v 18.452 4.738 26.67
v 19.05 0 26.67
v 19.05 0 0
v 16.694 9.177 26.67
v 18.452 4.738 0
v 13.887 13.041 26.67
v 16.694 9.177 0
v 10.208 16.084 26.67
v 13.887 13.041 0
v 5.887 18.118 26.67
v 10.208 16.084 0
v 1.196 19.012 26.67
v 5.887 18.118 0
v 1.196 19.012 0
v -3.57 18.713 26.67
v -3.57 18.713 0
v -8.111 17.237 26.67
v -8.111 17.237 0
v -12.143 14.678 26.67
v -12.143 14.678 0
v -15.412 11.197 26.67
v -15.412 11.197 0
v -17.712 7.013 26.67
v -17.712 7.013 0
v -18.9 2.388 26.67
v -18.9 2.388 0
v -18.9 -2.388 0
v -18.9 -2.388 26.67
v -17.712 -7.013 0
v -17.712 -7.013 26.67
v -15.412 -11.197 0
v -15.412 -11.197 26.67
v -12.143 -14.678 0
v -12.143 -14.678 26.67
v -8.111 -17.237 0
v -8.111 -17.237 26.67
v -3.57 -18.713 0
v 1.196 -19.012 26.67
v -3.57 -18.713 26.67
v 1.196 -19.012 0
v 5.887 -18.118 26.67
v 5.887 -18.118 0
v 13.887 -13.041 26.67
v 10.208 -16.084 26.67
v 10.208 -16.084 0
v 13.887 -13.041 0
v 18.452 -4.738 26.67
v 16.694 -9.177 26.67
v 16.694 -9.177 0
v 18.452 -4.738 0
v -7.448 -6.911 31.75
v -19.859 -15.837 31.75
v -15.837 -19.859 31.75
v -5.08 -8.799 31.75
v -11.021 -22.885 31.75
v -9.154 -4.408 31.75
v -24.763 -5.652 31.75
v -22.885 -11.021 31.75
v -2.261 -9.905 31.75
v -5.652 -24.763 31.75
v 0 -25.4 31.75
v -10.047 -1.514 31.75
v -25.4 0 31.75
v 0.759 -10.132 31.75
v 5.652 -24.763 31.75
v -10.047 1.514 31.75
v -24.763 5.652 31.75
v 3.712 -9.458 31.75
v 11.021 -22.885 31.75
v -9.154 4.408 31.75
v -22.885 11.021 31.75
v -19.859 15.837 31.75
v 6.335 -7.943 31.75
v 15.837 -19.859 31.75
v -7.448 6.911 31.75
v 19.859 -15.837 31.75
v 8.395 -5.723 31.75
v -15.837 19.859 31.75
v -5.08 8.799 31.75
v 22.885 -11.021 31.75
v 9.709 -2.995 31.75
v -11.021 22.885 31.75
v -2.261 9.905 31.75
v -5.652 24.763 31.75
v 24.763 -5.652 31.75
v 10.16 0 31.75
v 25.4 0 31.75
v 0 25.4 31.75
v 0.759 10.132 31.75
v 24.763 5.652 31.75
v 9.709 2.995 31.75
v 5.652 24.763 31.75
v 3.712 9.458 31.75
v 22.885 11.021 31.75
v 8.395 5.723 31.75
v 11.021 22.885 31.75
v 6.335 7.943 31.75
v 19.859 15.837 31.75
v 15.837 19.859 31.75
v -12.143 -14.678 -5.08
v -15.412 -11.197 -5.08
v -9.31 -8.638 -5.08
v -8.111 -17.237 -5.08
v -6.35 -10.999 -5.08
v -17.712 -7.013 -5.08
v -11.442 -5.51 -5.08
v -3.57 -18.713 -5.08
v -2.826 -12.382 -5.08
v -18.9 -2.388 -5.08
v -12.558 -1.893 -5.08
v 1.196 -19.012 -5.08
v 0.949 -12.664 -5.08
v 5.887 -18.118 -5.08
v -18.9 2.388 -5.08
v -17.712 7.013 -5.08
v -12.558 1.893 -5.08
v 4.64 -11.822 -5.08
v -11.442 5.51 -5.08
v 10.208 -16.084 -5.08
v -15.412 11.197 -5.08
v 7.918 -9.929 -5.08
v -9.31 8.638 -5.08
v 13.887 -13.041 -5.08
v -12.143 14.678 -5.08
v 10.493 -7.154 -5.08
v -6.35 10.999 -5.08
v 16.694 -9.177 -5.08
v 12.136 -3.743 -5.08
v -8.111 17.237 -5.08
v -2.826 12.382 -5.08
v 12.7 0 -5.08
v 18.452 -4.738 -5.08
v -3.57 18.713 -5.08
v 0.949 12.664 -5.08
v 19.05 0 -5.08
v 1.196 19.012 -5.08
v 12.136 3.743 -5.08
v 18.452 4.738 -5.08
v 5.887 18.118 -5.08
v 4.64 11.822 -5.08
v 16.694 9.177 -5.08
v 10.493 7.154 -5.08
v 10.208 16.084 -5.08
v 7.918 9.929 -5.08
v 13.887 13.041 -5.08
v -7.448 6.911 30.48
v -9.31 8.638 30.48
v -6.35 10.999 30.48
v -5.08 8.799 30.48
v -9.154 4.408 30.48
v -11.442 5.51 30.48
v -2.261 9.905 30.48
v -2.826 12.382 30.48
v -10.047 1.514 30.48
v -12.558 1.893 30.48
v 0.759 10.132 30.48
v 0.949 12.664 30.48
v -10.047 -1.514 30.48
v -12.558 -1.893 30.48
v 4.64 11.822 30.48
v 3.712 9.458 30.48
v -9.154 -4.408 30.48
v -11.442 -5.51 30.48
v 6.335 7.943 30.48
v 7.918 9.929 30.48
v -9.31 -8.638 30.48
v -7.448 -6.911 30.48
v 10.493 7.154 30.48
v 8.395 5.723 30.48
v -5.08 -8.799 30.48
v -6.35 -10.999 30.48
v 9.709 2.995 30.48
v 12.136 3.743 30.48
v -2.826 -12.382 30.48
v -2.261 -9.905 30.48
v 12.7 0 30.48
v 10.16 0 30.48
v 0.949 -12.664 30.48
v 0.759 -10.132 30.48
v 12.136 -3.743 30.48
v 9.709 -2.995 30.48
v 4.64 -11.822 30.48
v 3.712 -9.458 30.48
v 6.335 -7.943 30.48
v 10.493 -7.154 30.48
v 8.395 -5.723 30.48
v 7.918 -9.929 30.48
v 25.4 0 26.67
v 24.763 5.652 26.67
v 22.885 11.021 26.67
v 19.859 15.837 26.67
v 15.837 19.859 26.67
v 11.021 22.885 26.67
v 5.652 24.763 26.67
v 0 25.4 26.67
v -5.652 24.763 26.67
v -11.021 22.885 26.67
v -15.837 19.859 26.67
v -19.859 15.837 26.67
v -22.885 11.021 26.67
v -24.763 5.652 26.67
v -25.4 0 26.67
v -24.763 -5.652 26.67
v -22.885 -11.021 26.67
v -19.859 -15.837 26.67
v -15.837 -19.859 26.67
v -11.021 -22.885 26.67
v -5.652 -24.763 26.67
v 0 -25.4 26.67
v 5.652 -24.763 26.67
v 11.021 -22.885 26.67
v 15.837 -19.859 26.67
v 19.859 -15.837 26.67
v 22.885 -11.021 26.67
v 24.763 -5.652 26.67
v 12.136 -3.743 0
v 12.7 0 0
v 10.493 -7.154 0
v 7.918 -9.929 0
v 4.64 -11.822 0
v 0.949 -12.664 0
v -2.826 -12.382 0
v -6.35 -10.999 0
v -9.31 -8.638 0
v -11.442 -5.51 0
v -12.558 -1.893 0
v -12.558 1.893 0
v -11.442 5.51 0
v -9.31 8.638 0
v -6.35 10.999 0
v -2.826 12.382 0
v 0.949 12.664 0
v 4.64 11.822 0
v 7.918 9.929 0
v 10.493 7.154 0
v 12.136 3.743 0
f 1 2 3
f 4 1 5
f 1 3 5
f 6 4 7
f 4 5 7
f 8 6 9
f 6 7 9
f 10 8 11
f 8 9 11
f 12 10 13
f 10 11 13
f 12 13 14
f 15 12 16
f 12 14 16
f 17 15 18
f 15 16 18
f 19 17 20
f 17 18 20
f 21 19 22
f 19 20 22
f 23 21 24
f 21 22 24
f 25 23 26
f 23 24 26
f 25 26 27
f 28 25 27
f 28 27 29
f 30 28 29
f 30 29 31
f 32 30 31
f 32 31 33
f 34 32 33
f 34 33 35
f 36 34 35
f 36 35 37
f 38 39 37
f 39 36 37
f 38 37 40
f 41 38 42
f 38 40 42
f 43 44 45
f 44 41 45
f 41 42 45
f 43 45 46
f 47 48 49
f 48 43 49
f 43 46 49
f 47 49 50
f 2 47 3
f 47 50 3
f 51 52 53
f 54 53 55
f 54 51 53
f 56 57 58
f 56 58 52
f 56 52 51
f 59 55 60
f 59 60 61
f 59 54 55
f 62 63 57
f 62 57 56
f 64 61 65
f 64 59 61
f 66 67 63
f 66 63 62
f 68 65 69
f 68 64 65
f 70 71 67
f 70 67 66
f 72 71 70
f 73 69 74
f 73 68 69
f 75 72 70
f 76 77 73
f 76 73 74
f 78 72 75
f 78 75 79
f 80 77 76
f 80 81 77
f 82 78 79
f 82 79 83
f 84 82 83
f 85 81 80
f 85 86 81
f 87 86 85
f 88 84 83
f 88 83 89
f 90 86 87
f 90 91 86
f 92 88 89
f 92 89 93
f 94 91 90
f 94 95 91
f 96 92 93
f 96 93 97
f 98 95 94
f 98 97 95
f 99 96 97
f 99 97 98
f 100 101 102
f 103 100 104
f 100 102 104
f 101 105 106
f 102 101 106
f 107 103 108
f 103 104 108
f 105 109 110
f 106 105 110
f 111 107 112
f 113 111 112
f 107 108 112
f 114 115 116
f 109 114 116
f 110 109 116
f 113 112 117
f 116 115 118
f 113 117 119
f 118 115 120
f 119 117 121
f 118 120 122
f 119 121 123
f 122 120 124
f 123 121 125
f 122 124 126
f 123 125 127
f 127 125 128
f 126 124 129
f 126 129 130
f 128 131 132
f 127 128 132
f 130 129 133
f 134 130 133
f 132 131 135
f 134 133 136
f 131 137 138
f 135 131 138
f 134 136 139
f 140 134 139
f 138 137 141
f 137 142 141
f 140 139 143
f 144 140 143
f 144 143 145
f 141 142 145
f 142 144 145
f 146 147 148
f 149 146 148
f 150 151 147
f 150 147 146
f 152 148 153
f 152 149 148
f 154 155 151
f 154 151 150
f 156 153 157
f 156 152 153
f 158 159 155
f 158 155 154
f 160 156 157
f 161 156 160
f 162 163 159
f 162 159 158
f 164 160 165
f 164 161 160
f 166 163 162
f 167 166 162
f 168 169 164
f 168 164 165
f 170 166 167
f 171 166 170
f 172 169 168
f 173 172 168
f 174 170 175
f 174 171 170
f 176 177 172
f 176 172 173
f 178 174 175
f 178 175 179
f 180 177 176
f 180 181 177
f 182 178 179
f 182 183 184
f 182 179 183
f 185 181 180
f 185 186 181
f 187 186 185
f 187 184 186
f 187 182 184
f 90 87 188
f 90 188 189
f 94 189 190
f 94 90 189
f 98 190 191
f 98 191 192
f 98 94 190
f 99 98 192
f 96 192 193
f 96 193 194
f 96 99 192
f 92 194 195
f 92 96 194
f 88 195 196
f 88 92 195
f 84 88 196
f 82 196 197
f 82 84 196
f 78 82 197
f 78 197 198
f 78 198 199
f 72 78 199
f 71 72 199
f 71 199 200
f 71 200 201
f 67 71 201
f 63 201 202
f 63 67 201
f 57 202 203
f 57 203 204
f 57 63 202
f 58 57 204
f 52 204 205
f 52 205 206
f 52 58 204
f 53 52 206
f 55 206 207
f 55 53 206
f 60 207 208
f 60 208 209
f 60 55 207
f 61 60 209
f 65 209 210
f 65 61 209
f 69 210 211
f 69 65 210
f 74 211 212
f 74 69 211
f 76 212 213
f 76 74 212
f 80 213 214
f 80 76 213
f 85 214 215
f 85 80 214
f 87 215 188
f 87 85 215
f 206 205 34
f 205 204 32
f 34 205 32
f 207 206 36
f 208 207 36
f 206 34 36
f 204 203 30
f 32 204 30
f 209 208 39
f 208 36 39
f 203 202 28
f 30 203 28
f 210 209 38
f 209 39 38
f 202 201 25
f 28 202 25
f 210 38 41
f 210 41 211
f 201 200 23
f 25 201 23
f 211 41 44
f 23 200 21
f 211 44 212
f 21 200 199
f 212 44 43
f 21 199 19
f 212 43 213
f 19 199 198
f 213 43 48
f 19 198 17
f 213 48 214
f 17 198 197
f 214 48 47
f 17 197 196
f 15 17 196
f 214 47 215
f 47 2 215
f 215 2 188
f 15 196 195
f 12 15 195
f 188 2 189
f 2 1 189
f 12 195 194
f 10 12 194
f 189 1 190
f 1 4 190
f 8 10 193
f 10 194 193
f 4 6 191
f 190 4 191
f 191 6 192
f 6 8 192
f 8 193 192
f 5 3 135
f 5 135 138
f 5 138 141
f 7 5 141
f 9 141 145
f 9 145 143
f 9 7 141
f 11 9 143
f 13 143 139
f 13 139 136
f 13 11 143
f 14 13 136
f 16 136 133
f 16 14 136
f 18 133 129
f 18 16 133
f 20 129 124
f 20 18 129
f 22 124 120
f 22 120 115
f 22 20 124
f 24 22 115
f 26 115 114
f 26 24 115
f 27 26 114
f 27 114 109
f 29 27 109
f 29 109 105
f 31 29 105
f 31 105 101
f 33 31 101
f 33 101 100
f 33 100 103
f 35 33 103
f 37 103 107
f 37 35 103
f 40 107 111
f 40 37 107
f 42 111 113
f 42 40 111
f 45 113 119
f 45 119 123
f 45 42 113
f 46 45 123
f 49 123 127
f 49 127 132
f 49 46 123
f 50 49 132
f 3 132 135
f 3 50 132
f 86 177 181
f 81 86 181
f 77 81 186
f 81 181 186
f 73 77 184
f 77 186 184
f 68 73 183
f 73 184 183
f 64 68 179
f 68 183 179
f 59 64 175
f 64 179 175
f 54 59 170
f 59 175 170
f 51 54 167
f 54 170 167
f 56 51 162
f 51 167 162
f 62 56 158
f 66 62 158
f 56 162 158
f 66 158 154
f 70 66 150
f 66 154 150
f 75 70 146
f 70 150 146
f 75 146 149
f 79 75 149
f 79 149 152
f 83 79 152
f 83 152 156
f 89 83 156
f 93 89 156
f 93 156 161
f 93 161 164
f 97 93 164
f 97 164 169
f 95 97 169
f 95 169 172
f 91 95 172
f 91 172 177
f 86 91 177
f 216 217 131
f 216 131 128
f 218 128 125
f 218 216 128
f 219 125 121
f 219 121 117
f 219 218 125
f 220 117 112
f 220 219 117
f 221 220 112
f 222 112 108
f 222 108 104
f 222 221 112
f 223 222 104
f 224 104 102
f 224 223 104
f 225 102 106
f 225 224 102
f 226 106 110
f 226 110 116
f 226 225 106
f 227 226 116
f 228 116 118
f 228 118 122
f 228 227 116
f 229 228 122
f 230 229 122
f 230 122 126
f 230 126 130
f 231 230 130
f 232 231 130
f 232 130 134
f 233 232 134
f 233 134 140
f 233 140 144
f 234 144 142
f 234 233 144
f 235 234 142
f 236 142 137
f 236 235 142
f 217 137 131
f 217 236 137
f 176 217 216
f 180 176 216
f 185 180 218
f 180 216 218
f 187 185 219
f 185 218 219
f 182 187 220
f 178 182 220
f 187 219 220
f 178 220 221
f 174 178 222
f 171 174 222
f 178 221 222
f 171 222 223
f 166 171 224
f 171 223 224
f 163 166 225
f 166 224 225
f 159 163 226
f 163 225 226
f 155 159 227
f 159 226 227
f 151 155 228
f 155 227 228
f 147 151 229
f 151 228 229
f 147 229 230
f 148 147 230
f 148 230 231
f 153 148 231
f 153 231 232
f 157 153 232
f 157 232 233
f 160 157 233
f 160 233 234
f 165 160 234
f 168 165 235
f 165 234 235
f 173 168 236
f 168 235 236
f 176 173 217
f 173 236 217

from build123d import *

# Parameters (mm, degrees)
F0_R     = 19.05
F1_DEPTH = 31.75
F4_R     = 25.4
F5_DEPTH = 5.08
F3_R     = 12.7
F6_DEPTH = 30.48
F2_R     = 10.16
F7_DEPTH = 42.672
F8_DEPTH = 5.08


with BuildPart() as f1:
    # F0 (on Top) → F1 (new body)
    with BuildSketch(Plane.XY):
        Circle(F0_R)
    extrude(amount=F1_DEPTH)

    # F4 (on face) → F5 (join)
    with BuildSketch(Plane.XY.offset(31.75)):
        Circle(F4_R)
    extrude(amount=-F5_DEPTH)

    # F3 (on face) → F6 (cut)
    with BuildSketch(Plane(origin=(0, 0, 0), x_dir=(1, 0, 0), z_dir=(0, 0, -1))):
        Circle(F3_R)
    extrude(amount=-F6_DEPTH, mode=Mode.SUBTRACT)

    # F2 (on face) → F7 (cut)
    with BuildSketch(Plane(origin=(0, 0, 0), x_dir=(1, 0, 0), z_dir=(0, 0, -1))):
        Circle(F2_R)
    extrude(amount=-F7_DEPTH, mode=Mode.SUBTRACT)

    # F8 (add): a face of the model
    f8_faces = [f1.faces().sort_by_distance(p)[0] for p in [
        (-18.5111846327, 0, 0),
    ]]
    extrude(f8_faces, amount=F8_DEPTH)


solid = f1.part
